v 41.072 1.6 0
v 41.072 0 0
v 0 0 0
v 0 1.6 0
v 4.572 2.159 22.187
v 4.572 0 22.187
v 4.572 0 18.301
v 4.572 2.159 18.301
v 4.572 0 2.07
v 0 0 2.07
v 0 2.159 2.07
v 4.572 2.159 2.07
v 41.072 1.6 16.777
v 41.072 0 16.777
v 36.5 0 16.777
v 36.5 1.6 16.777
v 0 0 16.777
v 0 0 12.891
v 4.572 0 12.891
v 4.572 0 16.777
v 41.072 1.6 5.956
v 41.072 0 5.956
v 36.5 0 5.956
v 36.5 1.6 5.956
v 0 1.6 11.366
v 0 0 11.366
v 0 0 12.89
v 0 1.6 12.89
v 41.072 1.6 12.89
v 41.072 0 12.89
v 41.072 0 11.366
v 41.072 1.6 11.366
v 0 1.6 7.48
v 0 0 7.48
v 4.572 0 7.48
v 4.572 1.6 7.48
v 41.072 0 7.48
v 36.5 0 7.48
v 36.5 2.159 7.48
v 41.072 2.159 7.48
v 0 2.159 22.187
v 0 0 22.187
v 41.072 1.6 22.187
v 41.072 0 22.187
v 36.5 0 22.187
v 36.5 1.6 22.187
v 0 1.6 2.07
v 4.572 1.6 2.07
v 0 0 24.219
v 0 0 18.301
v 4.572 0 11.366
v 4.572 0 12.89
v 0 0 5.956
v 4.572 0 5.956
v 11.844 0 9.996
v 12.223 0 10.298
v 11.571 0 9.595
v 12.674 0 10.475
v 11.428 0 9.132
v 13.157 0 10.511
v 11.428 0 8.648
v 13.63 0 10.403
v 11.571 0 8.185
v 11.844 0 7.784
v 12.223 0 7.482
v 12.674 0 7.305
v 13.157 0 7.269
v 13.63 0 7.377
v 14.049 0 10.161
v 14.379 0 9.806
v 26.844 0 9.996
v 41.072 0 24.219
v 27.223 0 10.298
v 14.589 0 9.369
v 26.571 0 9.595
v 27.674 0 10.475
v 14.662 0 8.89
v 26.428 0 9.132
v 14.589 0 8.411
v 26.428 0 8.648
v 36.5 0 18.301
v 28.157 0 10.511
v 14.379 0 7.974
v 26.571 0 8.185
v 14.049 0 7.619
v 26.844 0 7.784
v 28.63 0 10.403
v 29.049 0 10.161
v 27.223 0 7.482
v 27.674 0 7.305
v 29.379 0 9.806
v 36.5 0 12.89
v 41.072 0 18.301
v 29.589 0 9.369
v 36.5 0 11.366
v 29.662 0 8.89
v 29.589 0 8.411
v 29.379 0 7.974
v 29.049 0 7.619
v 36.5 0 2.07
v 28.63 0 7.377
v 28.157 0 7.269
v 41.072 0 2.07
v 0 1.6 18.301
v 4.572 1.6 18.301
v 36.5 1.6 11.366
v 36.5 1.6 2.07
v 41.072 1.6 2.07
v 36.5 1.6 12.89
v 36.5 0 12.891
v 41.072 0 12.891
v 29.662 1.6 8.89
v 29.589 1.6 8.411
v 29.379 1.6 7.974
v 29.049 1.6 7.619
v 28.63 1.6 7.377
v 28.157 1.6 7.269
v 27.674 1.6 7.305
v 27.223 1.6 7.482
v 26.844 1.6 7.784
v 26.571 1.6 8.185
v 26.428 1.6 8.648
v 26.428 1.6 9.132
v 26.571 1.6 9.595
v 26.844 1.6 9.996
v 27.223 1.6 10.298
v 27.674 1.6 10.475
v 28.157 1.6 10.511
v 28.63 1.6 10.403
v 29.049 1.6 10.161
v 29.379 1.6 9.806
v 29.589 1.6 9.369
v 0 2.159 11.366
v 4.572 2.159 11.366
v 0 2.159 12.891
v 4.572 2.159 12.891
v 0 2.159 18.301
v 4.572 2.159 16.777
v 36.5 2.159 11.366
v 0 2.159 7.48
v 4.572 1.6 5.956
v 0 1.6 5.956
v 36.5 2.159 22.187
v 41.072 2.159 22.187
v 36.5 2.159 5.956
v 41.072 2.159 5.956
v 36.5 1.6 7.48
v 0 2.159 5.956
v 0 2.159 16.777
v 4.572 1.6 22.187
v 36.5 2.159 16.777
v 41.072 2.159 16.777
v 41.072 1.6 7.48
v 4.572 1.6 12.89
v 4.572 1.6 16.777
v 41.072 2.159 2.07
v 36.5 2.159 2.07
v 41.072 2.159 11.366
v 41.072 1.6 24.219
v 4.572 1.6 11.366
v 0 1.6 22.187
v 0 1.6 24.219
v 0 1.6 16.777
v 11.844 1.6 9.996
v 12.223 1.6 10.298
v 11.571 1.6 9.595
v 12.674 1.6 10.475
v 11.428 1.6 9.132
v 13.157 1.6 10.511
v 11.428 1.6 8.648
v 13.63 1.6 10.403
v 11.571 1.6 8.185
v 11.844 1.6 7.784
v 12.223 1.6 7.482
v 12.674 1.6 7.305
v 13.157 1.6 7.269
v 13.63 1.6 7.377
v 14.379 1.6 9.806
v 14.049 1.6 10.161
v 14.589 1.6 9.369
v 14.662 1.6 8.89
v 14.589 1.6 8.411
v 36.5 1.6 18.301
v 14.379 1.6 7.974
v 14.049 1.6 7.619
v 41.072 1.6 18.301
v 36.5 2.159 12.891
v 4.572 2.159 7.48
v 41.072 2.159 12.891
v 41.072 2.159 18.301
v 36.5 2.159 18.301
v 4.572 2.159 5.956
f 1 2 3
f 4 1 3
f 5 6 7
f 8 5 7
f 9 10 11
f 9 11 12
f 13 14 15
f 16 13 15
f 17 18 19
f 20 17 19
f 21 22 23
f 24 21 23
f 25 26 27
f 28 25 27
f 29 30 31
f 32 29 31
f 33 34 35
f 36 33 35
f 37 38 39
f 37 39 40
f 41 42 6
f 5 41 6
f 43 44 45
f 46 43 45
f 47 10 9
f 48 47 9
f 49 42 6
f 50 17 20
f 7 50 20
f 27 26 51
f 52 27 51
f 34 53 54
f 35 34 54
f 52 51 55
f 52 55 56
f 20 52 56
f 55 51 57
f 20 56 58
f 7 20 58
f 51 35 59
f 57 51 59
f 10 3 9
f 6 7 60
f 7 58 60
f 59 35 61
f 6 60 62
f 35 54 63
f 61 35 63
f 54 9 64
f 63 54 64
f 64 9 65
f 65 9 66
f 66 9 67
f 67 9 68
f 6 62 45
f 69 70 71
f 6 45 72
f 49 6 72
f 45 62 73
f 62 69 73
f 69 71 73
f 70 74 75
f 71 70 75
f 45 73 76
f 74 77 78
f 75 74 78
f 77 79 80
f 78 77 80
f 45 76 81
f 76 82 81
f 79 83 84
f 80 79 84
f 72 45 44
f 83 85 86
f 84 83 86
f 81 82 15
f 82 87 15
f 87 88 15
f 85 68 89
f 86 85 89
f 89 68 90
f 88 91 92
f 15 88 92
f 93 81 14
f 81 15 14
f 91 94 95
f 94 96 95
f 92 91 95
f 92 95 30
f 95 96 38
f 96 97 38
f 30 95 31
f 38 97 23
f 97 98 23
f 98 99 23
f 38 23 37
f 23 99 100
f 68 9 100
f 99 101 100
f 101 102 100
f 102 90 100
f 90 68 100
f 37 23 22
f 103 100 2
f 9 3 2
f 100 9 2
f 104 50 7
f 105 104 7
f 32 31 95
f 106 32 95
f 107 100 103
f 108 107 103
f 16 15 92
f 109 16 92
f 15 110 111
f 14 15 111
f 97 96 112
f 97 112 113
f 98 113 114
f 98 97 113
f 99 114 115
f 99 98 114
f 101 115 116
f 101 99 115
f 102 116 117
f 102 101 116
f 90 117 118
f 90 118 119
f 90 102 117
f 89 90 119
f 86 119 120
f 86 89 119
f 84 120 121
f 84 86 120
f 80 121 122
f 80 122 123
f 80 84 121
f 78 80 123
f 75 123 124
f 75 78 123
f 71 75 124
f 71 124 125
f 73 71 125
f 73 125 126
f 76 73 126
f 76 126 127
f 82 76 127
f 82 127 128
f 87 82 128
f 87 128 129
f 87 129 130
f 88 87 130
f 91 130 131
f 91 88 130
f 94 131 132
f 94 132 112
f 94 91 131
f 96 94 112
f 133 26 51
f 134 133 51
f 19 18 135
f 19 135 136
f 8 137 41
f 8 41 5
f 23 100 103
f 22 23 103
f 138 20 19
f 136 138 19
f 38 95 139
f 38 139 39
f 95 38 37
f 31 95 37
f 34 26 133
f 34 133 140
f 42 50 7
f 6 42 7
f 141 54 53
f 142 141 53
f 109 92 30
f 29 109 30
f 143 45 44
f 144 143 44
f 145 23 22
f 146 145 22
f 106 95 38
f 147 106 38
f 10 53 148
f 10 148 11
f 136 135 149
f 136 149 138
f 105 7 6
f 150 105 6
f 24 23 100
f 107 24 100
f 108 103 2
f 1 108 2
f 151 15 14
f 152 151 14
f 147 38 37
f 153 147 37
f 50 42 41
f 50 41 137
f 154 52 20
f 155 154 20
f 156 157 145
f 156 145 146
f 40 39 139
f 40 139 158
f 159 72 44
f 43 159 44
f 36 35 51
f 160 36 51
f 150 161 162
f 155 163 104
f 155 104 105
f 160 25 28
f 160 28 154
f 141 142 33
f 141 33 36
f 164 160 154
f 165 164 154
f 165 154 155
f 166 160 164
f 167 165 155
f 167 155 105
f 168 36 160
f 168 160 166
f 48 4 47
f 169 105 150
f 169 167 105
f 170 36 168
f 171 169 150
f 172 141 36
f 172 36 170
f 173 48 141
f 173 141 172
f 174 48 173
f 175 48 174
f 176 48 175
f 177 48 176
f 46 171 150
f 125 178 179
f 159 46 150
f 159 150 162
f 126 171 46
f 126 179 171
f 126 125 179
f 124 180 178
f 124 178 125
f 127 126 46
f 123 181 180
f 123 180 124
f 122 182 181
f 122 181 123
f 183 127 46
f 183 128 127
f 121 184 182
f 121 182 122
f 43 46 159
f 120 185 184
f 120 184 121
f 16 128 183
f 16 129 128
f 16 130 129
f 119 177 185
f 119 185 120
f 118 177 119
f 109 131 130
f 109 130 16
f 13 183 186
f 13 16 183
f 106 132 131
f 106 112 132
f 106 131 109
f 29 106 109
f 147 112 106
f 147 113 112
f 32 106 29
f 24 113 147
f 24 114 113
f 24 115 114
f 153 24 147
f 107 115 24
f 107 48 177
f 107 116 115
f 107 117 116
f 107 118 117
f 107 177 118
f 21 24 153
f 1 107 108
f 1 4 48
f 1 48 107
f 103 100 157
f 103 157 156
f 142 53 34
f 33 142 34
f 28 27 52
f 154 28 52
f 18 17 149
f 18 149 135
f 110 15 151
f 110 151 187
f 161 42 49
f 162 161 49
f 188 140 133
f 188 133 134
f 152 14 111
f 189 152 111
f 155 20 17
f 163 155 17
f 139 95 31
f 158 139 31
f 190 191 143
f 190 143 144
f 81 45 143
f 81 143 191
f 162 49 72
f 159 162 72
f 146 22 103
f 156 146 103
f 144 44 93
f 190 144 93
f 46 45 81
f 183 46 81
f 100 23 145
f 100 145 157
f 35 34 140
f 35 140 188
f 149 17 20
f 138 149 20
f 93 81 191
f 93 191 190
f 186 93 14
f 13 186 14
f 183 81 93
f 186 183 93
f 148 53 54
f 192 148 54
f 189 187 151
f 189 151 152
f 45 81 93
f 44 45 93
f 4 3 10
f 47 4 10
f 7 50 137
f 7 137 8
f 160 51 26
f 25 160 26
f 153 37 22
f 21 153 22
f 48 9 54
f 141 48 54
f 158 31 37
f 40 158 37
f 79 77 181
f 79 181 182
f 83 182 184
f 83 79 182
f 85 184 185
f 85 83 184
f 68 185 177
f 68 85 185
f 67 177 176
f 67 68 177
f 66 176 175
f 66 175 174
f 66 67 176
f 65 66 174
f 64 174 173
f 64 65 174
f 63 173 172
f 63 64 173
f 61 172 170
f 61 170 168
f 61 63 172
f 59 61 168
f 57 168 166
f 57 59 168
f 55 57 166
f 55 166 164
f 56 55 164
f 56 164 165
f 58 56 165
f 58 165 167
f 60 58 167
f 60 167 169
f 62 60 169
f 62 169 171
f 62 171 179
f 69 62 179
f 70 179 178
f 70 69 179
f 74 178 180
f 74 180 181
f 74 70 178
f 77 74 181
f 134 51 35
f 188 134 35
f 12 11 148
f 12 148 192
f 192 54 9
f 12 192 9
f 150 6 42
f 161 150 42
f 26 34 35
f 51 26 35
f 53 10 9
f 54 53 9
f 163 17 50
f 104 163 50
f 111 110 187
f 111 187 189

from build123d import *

# Parameters (mm, degrees)
SKETCH1_R             = 1.6256
BOSS_EXTRUDE1_DEPTH   = 1.6
SKETCH1_3_W           = 4.572
SKETCH1_3_H           = 3.8862
BOSS_EXTRUDE2_DEPTH   = 2.159
BOSS_EXTRUDE2_2_DEPTH = 2.159
BOSS_EXTRUDE2_3_DEPTH = 2.159
BOSS_EXTRUDE2_4_DEPTH = 2.159
BOSS_EXTRUDE2_5_DEPTH = 2.159
BOSS_EXTRUDE2_6_DEPTH = 2.159
BOSS_EXTRUDE2_7_DEPTH = 2.159
BOSS_EXTRUDE2_8_DEPTH = 2.159


with BuildPart() as part:
    # Sketch1 → Boss-Extrude1 (new body)
    with BuildSketch(Plane(origin=(0, 0, 0), x_dir=(1, 0, 0), z_dir=(0, 1, 0))):
        Polygon((41.0718, -18.3007), (41.0718, -16.7767), (36.4998, -16.7767), (36.4998, -12.8905), (41.0718, -12.8905), (41.0718, -11.3665), (36.4998, -11.3665), (36.4998, -7.4803), (41.0718, -7.4803), (41.0718, -5.9563), (36.4998, -5.9563), (36.4998, -2.0701), (41.0718, -2.0701), (41.0718, 0), (0, 0), (0, -2.0701), (4.572, -2.0701), (4.572, -5.9563), (0, -5.9563), (0, -7.4803), (4.572, -7.4803), (4.572, -11.3665), (0, -11.3665), (0, -12.8905), (4.572, -12.8905), (4.572, -16.7767), (0, -16.7767), (0, -18.3007), (4.572, -18.3007), (4.572, -22.1869), (0, -22.1869), (0, -24.2189), (41.0718, -24.2189), (41.0718, -22.1869), (36.4998, -22.1869), (36.4998, -18.3007), align=None)
        with Locations((13.0359, -8.89)):
            Circle(SKETCH1_R, mode=Mode.SUBTRACT)
        with Locations((28.0359, -8.89)):
            Circle(SKETCH1_R, mode=Mode.SUBTRACT)
    extrude(amount=BOSS_EXTRUDE1_DEPTH)


with BuildPart() as body_2:
    # Sketch1<3> → Boss-Extrude2 (new body)
    with BuildSketch(Plane(origin=(0, 0, 0), x_dir=(1, 0, 0), z_dir=(0, 1, 0))):
        with Locations((2.286, -4.0132)):
            Rectangle(SKETCH1_3_W, SKETCH1_3_H)
    extrude(amount=BOSS_EXTRUDE2_DEPTH)


with BuildPart() as body_3:
    # Sketch1<3> → Boss-Extrude2 2 (new body)
    with BuildSketch(Plane(origin=(0, 0, 0), x_dir=(1, 0, 0), z_dir=(0, 1, 0))):
        with Locations((2.286, -9.4234)):
            Rectangle(SKETCH1_3_W, SKETCH1_3_H)
    extrude(amount=BOSS_EXTRUDE2_2_DEPTH)


with BuildPart() as body_4:
    # Sketch1<3> → Boss-Extrude2 3 (new body)
    with BuildSketch(Plane(origin=(0, 0, 0), x_dir=(1, 0, 0), z_dir=(0, 1, 0))):
        with Locations((2.286, -14.8336)):
            Rectangle(SKETCH1_3_W, SKETCH1_3_H)
    extrude(amount=BOSS_EXTRUDE2_3_DEPTH)


with BuildPart() as body_5:
    # Sketch1<3> → Boss-Extrude2 4 (new body)
    with BuildSketch(Plane(origin=(0, 0, 0), x_dir=(1, 0, 0), z_dir=(0, 1, 0))):
        with Locations((2.286, -20.2438)):
            Rectangle(SKETCH1_3_W, SKETCH1_3_H)
    extrude(amount=BOSS_EXTRUDE2_4_DEPTH)


with BuildPart() as body_6:
    # Sketch1<3> → Boss-Extrude2 5 (new body)
    with BuildSketch(Plane(origin=(0, 0, 0), x_dir=(1, 0, 0), z_dir=(0, 1, 0))):
        with Locations((38.7858, -20.2438)):
            Rectangle(SKETCH1_3_W, SKETCH1_3_H)
    extrude(amount=BOSS_EXTRUDE2_5_DEPTH)


with BuildPart() as body_7:
    # Sketch1<3> → Boss-Extrude2 6 (new body)
    with BuildSketch(Plane(origin=(0, 0, 0), x_dir=(1, 0, 0), z_dir=(0, 1, 0))):
        with Locations((38.7858, -14.8336)):
            Rectangle(SKETCH1_3_W, SKETCH1_3_H)
    extrude(amount=BOSS_EXTRUDE2_6_DEPTH)


with BuildPart() as body_8:
    # Sketch1<3> → Boss-Extrude2 7 (new body)
    with BuildSketch(Plane(origin=(0, 0, 0), x_dir=(1, 0, 0), z_dir=(0, 1, 0))):
        with Locations((38.7858, -9.4234)):
            Rectangle(SKETCH1_3_W, SKETCH1_3_H)
    extrude(amount=BOSS_EXTRUDE2_7_DEPTH)


with BuildPart() as body_9:
    # Sketch1<3> → Boss-Extrude2 8 (new body)
    with BuildSketch(Plane(origin=(0, 0, 0), x_dir=(1, 0, 0), z_dir=(0, 1, 0))):
        with Locations((38.7858, -4.0132)):
            Rectangle(SKETCH1_3_W, SKETCH1_3_H)
    extrude(amount=BOSS_EXTRUDE2_8_DEPTH)


solid = Compound([part.part, body_2.part, body_3.part, body_4.part, body_5.part, body_6.part, body_7.part, body_8.part, body_9.part])
